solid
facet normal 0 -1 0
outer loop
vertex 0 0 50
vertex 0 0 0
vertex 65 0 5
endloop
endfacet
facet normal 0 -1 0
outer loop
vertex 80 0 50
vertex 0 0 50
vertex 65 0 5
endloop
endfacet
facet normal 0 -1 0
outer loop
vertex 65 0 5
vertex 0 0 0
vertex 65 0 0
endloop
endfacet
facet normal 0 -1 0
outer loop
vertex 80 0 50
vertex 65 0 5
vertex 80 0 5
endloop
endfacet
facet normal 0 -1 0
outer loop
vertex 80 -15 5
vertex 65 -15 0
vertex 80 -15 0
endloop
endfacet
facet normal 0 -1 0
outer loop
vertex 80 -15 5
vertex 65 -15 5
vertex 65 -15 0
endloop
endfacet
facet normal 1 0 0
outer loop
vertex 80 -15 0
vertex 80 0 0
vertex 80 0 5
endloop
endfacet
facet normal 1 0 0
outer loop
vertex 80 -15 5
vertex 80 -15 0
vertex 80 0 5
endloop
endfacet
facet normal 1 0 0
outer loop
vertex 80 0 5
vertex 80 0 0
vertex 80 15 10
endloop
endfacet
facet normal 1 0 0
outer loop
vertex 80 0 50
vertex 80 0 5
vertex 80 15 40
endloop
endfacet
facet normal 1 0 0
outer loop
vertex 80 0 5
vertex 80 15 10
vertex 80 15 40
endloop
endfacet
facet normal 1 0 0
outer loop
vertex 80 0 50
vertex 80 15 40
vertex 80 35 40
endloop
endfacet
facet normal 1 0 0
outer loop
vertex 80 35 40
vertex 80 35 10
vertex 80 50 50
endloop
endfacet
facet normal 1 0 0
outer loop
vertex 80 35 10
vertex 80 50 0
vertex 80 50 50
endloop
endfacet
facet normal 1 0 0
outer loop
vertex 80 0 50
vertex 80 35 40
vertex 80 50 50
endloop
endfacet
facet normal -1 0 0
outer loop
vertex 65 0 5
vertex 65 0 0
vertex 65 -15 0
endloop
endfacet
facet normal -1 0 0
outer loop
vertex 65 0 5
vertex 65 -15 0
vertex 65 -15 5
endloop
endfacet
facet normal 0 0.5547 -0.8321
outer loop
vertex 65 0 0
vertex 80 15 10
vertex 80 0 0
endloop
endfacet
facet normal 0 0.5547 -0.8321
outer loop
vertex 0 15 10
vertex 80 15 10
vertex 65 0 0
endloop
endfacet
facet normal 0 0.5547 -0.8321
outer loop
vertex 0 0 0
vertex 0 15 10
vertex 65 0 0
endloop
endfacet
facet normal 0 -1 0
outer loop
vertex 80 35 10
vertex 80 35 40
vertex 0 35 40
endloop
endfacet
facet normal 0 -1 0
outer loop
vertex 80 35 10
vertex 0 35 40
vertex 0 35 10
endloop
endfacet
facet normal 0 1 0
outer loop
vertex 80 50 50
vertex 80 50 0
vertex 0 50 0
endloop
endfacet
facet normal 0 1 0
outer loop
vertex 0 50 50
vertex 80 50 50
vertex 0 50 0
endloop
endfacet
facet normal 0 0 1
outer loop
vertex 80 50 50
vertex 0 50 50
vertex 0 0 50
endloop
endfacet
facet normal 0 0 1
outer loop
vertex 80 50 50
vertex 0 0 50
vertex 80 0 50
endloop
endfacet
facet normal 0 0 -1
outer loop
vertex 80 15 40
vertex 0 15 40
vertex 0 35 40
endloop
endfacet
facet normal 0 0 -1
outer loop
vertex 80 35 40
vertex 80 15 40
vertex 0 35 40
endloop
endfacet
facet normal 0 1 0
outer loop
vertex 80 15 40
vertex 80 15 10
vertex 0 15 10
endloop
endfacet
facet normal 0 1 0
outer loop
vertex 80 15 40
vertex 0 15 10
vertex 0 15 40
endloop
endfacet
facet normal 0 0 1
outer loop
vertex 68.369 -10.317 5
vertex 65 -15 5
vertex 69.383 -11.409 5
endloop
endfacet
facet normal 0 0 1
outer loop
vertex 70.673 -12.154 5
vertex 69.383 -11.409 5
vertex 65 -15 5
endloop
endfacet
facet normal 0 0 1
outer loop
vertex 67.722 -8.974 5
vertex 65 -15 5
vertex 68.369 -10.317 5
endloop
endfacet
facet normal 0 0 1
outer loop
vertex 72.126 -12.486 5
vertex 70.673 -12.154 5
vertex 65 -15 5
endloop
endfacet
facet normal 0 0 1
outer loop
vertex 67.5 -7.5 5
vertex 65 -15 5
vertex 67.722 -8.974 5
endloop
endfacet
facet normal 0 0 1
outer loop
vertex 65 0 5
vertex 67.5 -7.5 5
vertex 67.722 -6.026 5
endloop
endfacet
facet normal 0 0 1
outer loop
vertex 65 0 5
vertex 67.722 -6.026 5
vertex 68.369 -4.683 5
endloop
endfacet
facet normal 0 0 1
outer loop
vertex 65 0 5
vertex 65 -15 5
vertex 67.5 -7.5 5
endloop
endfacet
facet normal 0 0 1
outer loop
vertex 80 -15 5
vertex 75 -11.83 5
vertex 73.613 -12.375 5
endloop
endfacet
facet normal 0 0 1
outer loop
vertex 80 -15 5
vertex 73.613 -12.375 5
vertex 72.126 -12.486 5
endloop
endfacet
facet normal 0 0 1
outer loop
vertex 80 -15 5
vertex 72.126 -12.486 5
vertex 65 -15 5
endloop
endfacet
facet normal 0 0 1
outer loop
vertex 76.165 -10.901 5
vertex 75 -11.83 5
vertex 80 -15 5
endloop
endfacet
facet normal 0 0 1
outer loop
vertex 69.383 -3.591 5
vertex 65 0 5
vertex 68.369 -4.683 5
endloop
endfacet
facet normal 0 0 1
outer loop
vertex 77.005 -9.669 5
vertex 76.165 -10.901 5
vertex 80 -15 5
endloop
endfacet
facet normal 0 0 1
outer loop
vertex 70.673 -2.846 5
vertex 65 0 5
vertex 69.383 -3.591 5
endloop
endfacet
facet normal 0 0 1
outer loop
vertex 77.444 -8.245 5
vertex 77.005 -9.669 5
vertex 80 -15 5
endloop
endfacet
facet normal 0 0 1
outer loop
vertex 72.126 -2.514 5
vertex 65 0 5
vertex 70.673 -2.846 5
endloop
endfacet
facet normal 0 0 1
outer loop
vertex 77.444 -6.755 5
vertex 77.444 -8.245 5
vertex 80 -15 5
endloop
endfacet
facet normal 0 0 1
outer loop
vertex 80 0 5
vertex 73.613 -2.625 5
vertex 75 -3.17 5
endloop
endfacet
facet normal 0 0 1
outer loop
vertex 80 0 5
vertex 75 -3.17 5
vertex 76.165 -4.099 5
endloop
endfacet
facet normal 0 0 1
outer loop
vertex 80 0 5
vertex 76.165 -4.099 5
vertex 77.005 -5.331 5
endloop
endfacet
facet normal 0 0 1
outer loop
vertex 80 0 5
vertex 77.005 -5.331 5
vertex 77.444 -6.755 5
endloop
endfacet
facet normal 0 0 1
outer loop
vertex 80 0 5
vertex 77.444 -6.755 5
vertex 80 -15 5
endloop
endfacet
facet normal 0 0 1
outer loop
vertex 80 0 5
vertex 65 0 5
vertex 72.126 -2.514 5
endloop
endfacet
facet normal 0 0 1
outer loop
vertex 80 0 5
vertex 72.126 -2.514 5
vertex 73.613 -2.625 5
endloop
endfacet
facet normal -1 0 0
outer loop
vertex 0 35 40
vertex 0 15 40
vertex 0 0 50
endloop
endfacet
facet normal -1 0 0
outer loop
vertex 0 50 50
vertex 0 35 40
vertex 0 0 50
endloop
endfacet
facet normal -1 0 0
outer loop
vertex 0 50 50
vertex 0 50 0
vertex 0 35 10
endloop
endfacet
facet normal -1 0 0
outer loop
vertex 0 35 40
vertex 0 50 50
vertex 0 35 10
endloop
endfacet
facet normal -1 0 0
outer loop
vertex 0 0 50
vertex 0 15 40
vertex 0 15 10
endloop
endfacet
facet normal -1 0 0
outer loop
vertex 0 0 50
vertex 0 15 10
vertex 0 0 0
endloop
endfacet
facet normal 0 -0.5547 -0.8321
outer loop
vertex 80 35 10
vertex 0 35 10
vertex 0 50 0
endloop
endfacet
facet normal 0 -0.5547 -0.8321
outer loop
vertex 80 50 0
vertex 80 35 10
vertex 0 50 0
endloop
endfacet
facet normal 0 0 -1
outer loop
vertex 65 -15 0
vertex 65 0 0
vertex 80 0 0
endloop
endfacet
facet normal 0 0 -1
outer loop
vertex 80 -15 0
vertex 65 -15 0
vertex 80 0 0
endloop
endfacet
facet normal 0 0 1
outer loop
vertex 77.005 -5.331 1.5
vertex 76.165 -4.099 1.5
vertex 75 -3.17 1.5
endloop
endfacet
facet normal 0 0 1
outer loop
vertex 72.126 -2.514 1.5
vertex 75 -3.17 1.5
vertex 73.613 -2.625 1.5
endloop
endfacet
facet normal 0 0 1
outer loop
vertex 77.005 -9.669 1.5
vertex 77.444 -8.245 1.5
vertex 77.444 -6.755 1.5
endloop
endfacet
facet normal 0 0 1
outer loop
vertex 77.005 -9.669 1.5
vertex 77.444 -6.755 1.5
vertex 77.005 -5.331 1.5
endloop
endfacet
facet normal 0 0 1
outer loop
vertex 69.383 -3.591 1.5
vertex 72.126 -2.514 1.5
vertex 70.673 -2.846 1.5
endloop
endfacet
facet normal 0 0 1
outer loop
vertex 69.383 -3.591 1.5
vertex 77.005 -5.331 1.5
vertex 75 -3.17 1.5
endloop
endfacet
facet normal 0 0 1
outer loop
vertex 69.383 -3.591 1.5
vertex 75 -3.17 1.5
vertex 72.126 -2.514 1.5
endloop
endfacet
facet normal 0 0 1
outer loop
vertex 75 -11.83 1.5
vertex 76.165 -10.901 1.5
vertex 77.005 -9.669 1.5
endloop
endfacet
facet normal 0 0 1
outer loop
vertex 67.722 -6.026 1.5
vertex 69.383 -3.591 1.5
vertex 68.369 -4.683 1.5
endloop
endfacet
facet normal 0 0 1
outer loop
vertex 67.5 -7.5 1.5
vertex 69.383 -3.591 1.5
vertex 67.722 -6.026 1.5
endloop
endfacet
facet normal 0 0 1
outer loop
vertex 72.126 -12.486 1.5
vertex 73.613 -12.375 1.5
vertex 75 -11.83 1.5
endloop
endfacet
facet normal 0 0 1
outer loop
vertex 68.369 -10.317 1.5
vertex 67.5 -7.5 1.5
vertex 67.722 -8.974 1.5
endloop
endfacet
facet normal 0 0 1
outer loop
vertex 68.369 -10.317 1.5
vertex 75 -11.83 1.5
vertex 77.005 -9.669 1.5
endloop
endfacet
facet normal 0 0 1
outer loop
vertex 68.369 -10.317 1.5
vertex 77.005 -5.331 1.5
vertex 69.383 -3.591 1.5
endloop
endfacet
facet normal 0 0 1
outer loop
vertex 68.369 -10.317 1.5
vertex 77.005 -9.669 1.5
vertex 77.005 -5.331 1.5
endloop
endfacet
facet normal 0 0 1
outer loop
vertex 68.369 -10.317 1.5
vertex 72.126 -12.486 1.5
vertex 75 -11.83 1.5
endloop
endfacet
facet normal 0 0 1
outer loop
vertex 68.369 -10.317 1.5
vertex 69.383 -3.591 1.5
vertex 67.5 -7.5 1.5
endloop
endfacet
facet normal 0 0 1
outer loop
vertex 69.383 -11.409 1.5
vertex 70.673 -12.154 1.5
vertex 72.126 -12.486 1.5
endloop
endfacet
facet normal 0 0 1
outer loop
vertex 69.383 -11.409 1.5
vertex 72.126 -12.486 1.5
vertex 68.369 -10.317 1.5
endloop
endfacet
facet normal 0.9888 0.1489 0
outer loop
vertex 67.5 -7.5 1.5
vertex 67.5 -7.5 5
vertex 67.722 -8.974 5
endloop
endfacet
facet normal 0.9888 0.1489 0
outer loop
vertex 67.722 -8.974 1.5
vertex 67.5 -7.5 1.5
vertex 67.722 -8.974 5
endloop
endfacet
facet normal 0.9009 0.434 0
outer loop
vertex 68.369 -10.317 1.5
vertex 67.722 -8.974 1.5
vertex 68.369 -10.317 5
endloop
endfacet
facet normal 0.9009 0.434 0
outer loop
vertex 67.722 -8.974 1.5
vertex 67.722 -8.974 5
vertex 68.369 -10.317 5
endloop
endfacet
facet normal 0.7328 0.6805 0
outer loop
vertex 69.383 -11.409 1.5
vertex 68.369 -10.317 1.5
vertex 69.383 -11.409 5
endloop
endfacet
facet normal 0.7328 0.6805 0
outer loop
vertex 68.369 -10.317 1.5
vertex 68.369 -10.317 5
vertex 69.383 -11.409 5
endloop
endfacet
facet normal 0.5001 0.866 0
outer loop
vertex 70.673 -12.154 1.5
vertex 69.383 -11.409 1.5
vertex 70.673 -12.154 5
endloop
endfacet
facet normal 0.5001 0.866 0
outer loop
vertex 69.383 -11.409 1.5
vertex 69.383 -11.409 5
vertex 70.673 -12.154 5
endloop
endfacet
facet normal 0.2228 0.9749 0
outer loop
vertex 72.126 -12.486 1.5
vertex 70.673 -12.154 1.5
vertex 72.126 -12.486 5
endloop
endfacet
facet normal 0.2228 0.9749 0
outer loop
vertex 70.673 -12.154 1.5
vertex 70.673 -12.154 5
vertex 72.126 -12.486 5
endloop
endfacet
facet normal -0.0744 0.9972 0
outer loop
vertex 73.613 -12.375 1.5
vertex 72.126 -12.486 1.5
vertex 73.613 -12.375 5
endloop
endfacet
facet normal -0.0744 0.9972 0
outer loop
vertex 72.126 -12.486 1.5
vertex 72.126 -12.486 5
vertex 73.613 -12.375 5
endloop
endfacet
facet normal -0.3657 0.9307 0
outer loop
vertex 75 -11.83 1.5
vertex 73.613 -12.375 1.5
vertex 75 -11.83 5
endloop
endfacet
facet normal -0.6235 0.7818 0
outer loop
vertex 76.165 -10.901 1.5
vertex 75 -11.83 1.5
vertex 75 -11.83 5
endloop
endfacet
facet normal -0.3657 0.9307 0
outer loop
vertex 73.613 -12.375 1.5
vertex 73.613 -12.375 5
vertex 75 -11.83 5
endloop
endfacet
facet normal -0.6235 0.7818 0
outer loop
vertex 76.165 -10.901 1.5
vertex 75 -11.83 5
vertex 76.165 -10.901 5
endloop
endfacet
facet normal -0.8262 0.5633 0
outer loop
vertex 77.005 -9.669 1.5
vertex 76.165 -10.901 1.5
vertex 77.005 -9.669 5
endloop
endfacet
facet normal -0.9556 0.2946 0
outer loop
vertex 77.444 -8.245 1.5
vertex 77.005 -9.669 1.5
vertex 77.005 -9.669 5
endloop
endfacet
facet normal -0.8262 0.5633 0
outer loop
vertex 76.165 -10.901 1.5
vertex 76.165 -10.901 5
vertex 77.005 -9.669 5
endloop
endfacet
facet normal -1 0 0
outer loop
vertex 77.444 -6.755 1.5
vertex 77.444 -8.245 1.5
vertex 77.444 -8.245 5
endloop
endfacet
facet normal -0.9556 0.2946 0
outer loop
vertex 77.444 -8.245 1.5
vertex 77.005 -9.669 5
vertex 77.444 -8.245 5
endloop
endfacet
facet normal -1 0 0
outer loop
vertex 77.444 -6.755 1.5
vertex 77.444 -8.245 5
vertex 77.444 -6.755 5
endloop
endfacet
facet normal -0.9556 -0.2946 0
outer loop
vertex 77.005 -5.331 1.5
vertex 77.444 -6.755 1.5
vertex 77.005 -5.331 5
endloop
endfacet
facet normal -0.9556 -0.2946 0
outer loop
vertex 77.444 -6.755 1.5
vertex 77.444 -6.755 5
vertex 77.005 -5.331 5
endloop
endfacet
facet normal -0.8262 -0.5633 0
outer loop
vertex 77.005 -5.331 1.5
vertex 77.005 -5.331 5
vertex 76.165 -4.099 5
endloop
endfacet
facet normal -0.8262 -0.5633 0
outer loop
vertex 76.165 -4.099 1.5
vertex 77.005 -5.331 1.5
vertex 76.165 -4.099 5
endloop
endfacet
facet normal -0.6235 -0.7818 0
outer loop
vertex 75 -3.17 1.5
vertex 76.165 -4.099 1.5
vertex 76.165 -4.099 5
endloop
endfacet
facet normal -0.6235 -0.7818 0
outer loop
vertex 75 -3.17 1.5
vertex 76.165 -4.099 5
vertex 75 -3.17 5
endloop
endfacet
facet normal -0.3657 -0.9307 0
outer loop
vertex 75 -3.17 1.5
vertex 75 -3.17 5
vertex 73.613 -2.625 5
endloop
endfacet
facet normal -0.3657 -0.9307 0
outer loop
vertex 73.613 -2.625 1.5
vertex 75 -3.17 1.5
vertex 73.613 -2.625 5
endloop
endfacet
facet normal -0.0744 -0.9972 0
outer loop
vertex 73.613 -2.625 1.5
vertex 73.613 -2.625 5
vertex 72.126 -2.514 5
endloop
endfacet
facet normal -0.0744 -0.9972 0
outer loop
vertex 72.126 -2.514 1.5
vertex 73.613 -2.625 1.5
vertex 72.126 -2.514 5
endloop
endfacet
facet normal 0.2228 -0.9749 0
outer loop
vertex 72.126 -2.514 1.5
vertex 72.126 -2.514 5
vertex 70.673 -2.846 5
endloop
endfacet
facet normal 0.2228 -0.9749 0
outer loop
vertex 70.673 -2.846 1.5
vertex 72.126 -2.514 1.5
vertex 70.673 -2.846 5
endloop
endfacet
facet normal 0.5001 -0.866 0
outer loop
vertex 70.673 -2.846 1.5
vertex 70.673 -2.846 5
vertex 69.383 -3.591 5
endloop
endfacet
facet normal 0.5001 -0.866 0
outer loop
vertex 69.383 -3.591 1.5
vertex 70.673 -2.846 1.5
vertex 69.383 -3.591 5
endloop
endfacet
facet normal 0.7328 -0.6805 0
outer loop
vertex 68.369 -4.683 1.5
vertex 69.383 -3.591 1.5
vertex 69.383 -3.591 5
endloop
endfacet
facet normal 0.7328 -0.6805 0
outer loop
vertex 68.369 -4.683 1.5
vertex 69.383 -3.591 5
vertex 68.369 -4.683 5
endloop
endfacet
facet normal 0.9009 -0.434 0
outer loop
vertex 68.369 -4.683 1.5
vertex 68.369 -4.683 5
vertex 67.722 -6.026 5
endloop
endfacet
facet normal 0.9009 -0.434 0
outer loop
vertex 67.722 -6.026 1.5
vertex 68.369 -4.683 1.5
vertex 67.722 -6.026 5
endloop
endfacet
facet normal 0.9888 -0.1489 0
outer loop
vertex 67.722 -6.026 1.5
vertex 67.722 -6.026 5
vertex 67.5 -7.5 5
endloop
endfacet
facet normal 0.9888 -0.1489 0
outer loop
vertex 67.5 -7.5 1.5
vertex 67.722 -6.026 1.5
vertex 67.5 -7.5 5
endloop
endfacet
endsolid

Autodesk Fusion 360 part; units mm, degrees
sketch "Esquisse1" plane through (0, 0, 0) normal (0, 0, 1) x (1, 0, 0)
  line L0 (0, 0) -> (100, 0)
  line L1 (100, 0) -> (100, 50)
  line L2 (100, 50) -> (0, 50)
  line L3 (0, 50) -> (0, 0)
  dimension "d1" = 100
  dimension "d2" = 50
extrude "Extrusion1" add sketch "Esquisse1" along normal blind 60
sketch "Esquisse2" plane through (0, 0, 0) normal (-1, 0, 0) x (0, -1, 0)
  line L0 (-50, 0) -> (0, 0)
  line L1 (0, 0) -> (0, 60)
  line L2 (0, 60) -> (-50, 60)
  line L3 (-50, 60) -> (-50, 0)
  line L4 (-35, 0) -> (-15, 0)
  line L5 (-15, 0) -> (-15, 40)
  line L6 (-15, 40) -> (-35, 40)
  line L7 (-35, 40) -> (-35, 0)
  dimension "d5" = 15
  dimension "d6" = 20
  dimension "d7" = 40
extrude "Extrusion2" cut 1 faces at (33.3333, 33.3333, 60) along direction (0, 0, -1) blind 10
extrude "Extrusion3" cut sketch "Esquisse2" against normal blind 122 contours L0 L4 L5 L6 L7
extrude "Extrusion4" cut 1 faces at (100, 5, 30) along direction (-1, 0, 0) blind 20
sketch "Esquisse5" plane through (0, 0, 0) normal (-1, 0, 0) x (0, -1, 0)
  line L0 (-15, 40) -> (-15, 0)
  line L1 (-15, 0) -> (0, 0)
  line L2 (0, 0) -> (0, 50)
  line L3 (0, 50) -> (-50, 50)
  line L4 (-50, 50) -> (-50, 0)
  line L5 (-50, 0) -> (-35, 0)
  line L6 (-35, 0) -> (-35, 40)
  line L7 (-35, 40) -> (-15, 40)
  line L8 (-35, 0) -> (-35, 10)
  line L9 (-35, 10) -> (-50, 0)
  line L10 (-15, 0) -> (-15, 10)
  line L11 (-15, 10) -> (0, 0)
  dimension "d14" = 10
  dimension "d15" = 10
extrude "Extrusion5" cut sketch "Esquisse5" against normal blind 285 contours L0 L1 L10 L11 | L5 L6 L8 L9
sketch "Esquisse7" plane through (0, 0, 0) normal (0, -1, 0) x (1, 0, 0)
  line L0 (80, 0) -> (80, 50)
  line L1 (80, 50) -> (0, 50)
  line L2 (0, 50) -> (0, 0)
  line L3 (0, 0) -> (80, 0)
  line L4 (80, 0) -> (65, 0)
  line L5 (65, 0) -> (65, 5)
  line L6 (65, 5) -> (80, 5)
  line L7 (80, 5) -> (80, 0)
  dimension "d18" = 5
  dimension "d19" = 15
extrude "Extrusion6" add sketch "Esquisse7" along normal blind 15 contours L0 L3 L4 L5 L6 L7
sketch "Esquisse9" plane through (0, 0, 5) normal (0, 0, 1) x (-1, 0, 0)
  line L0 (-80, 0) -> (-65, 0)
  line L1 (-65, 0) -> (-65, 15)
  line L2 (-65, 15) -> (-80, 15)
  line L3 (-80, 15) -> (-80, 0)
  line L4 (-65, 0) -> (-80, 15)
  line L5 (-65, 15) -> (-80, 0)
  circle A0 centre (-72.5, 7.5) radius 5
  dimension "d22" = 10
extrude "Extrusion7" cut sketch "Esquisse9" against normal blind 3.5 contours L4 L5 A0 | L4 L5 A0 | L4 L5 A0 | L4 L5 A0
